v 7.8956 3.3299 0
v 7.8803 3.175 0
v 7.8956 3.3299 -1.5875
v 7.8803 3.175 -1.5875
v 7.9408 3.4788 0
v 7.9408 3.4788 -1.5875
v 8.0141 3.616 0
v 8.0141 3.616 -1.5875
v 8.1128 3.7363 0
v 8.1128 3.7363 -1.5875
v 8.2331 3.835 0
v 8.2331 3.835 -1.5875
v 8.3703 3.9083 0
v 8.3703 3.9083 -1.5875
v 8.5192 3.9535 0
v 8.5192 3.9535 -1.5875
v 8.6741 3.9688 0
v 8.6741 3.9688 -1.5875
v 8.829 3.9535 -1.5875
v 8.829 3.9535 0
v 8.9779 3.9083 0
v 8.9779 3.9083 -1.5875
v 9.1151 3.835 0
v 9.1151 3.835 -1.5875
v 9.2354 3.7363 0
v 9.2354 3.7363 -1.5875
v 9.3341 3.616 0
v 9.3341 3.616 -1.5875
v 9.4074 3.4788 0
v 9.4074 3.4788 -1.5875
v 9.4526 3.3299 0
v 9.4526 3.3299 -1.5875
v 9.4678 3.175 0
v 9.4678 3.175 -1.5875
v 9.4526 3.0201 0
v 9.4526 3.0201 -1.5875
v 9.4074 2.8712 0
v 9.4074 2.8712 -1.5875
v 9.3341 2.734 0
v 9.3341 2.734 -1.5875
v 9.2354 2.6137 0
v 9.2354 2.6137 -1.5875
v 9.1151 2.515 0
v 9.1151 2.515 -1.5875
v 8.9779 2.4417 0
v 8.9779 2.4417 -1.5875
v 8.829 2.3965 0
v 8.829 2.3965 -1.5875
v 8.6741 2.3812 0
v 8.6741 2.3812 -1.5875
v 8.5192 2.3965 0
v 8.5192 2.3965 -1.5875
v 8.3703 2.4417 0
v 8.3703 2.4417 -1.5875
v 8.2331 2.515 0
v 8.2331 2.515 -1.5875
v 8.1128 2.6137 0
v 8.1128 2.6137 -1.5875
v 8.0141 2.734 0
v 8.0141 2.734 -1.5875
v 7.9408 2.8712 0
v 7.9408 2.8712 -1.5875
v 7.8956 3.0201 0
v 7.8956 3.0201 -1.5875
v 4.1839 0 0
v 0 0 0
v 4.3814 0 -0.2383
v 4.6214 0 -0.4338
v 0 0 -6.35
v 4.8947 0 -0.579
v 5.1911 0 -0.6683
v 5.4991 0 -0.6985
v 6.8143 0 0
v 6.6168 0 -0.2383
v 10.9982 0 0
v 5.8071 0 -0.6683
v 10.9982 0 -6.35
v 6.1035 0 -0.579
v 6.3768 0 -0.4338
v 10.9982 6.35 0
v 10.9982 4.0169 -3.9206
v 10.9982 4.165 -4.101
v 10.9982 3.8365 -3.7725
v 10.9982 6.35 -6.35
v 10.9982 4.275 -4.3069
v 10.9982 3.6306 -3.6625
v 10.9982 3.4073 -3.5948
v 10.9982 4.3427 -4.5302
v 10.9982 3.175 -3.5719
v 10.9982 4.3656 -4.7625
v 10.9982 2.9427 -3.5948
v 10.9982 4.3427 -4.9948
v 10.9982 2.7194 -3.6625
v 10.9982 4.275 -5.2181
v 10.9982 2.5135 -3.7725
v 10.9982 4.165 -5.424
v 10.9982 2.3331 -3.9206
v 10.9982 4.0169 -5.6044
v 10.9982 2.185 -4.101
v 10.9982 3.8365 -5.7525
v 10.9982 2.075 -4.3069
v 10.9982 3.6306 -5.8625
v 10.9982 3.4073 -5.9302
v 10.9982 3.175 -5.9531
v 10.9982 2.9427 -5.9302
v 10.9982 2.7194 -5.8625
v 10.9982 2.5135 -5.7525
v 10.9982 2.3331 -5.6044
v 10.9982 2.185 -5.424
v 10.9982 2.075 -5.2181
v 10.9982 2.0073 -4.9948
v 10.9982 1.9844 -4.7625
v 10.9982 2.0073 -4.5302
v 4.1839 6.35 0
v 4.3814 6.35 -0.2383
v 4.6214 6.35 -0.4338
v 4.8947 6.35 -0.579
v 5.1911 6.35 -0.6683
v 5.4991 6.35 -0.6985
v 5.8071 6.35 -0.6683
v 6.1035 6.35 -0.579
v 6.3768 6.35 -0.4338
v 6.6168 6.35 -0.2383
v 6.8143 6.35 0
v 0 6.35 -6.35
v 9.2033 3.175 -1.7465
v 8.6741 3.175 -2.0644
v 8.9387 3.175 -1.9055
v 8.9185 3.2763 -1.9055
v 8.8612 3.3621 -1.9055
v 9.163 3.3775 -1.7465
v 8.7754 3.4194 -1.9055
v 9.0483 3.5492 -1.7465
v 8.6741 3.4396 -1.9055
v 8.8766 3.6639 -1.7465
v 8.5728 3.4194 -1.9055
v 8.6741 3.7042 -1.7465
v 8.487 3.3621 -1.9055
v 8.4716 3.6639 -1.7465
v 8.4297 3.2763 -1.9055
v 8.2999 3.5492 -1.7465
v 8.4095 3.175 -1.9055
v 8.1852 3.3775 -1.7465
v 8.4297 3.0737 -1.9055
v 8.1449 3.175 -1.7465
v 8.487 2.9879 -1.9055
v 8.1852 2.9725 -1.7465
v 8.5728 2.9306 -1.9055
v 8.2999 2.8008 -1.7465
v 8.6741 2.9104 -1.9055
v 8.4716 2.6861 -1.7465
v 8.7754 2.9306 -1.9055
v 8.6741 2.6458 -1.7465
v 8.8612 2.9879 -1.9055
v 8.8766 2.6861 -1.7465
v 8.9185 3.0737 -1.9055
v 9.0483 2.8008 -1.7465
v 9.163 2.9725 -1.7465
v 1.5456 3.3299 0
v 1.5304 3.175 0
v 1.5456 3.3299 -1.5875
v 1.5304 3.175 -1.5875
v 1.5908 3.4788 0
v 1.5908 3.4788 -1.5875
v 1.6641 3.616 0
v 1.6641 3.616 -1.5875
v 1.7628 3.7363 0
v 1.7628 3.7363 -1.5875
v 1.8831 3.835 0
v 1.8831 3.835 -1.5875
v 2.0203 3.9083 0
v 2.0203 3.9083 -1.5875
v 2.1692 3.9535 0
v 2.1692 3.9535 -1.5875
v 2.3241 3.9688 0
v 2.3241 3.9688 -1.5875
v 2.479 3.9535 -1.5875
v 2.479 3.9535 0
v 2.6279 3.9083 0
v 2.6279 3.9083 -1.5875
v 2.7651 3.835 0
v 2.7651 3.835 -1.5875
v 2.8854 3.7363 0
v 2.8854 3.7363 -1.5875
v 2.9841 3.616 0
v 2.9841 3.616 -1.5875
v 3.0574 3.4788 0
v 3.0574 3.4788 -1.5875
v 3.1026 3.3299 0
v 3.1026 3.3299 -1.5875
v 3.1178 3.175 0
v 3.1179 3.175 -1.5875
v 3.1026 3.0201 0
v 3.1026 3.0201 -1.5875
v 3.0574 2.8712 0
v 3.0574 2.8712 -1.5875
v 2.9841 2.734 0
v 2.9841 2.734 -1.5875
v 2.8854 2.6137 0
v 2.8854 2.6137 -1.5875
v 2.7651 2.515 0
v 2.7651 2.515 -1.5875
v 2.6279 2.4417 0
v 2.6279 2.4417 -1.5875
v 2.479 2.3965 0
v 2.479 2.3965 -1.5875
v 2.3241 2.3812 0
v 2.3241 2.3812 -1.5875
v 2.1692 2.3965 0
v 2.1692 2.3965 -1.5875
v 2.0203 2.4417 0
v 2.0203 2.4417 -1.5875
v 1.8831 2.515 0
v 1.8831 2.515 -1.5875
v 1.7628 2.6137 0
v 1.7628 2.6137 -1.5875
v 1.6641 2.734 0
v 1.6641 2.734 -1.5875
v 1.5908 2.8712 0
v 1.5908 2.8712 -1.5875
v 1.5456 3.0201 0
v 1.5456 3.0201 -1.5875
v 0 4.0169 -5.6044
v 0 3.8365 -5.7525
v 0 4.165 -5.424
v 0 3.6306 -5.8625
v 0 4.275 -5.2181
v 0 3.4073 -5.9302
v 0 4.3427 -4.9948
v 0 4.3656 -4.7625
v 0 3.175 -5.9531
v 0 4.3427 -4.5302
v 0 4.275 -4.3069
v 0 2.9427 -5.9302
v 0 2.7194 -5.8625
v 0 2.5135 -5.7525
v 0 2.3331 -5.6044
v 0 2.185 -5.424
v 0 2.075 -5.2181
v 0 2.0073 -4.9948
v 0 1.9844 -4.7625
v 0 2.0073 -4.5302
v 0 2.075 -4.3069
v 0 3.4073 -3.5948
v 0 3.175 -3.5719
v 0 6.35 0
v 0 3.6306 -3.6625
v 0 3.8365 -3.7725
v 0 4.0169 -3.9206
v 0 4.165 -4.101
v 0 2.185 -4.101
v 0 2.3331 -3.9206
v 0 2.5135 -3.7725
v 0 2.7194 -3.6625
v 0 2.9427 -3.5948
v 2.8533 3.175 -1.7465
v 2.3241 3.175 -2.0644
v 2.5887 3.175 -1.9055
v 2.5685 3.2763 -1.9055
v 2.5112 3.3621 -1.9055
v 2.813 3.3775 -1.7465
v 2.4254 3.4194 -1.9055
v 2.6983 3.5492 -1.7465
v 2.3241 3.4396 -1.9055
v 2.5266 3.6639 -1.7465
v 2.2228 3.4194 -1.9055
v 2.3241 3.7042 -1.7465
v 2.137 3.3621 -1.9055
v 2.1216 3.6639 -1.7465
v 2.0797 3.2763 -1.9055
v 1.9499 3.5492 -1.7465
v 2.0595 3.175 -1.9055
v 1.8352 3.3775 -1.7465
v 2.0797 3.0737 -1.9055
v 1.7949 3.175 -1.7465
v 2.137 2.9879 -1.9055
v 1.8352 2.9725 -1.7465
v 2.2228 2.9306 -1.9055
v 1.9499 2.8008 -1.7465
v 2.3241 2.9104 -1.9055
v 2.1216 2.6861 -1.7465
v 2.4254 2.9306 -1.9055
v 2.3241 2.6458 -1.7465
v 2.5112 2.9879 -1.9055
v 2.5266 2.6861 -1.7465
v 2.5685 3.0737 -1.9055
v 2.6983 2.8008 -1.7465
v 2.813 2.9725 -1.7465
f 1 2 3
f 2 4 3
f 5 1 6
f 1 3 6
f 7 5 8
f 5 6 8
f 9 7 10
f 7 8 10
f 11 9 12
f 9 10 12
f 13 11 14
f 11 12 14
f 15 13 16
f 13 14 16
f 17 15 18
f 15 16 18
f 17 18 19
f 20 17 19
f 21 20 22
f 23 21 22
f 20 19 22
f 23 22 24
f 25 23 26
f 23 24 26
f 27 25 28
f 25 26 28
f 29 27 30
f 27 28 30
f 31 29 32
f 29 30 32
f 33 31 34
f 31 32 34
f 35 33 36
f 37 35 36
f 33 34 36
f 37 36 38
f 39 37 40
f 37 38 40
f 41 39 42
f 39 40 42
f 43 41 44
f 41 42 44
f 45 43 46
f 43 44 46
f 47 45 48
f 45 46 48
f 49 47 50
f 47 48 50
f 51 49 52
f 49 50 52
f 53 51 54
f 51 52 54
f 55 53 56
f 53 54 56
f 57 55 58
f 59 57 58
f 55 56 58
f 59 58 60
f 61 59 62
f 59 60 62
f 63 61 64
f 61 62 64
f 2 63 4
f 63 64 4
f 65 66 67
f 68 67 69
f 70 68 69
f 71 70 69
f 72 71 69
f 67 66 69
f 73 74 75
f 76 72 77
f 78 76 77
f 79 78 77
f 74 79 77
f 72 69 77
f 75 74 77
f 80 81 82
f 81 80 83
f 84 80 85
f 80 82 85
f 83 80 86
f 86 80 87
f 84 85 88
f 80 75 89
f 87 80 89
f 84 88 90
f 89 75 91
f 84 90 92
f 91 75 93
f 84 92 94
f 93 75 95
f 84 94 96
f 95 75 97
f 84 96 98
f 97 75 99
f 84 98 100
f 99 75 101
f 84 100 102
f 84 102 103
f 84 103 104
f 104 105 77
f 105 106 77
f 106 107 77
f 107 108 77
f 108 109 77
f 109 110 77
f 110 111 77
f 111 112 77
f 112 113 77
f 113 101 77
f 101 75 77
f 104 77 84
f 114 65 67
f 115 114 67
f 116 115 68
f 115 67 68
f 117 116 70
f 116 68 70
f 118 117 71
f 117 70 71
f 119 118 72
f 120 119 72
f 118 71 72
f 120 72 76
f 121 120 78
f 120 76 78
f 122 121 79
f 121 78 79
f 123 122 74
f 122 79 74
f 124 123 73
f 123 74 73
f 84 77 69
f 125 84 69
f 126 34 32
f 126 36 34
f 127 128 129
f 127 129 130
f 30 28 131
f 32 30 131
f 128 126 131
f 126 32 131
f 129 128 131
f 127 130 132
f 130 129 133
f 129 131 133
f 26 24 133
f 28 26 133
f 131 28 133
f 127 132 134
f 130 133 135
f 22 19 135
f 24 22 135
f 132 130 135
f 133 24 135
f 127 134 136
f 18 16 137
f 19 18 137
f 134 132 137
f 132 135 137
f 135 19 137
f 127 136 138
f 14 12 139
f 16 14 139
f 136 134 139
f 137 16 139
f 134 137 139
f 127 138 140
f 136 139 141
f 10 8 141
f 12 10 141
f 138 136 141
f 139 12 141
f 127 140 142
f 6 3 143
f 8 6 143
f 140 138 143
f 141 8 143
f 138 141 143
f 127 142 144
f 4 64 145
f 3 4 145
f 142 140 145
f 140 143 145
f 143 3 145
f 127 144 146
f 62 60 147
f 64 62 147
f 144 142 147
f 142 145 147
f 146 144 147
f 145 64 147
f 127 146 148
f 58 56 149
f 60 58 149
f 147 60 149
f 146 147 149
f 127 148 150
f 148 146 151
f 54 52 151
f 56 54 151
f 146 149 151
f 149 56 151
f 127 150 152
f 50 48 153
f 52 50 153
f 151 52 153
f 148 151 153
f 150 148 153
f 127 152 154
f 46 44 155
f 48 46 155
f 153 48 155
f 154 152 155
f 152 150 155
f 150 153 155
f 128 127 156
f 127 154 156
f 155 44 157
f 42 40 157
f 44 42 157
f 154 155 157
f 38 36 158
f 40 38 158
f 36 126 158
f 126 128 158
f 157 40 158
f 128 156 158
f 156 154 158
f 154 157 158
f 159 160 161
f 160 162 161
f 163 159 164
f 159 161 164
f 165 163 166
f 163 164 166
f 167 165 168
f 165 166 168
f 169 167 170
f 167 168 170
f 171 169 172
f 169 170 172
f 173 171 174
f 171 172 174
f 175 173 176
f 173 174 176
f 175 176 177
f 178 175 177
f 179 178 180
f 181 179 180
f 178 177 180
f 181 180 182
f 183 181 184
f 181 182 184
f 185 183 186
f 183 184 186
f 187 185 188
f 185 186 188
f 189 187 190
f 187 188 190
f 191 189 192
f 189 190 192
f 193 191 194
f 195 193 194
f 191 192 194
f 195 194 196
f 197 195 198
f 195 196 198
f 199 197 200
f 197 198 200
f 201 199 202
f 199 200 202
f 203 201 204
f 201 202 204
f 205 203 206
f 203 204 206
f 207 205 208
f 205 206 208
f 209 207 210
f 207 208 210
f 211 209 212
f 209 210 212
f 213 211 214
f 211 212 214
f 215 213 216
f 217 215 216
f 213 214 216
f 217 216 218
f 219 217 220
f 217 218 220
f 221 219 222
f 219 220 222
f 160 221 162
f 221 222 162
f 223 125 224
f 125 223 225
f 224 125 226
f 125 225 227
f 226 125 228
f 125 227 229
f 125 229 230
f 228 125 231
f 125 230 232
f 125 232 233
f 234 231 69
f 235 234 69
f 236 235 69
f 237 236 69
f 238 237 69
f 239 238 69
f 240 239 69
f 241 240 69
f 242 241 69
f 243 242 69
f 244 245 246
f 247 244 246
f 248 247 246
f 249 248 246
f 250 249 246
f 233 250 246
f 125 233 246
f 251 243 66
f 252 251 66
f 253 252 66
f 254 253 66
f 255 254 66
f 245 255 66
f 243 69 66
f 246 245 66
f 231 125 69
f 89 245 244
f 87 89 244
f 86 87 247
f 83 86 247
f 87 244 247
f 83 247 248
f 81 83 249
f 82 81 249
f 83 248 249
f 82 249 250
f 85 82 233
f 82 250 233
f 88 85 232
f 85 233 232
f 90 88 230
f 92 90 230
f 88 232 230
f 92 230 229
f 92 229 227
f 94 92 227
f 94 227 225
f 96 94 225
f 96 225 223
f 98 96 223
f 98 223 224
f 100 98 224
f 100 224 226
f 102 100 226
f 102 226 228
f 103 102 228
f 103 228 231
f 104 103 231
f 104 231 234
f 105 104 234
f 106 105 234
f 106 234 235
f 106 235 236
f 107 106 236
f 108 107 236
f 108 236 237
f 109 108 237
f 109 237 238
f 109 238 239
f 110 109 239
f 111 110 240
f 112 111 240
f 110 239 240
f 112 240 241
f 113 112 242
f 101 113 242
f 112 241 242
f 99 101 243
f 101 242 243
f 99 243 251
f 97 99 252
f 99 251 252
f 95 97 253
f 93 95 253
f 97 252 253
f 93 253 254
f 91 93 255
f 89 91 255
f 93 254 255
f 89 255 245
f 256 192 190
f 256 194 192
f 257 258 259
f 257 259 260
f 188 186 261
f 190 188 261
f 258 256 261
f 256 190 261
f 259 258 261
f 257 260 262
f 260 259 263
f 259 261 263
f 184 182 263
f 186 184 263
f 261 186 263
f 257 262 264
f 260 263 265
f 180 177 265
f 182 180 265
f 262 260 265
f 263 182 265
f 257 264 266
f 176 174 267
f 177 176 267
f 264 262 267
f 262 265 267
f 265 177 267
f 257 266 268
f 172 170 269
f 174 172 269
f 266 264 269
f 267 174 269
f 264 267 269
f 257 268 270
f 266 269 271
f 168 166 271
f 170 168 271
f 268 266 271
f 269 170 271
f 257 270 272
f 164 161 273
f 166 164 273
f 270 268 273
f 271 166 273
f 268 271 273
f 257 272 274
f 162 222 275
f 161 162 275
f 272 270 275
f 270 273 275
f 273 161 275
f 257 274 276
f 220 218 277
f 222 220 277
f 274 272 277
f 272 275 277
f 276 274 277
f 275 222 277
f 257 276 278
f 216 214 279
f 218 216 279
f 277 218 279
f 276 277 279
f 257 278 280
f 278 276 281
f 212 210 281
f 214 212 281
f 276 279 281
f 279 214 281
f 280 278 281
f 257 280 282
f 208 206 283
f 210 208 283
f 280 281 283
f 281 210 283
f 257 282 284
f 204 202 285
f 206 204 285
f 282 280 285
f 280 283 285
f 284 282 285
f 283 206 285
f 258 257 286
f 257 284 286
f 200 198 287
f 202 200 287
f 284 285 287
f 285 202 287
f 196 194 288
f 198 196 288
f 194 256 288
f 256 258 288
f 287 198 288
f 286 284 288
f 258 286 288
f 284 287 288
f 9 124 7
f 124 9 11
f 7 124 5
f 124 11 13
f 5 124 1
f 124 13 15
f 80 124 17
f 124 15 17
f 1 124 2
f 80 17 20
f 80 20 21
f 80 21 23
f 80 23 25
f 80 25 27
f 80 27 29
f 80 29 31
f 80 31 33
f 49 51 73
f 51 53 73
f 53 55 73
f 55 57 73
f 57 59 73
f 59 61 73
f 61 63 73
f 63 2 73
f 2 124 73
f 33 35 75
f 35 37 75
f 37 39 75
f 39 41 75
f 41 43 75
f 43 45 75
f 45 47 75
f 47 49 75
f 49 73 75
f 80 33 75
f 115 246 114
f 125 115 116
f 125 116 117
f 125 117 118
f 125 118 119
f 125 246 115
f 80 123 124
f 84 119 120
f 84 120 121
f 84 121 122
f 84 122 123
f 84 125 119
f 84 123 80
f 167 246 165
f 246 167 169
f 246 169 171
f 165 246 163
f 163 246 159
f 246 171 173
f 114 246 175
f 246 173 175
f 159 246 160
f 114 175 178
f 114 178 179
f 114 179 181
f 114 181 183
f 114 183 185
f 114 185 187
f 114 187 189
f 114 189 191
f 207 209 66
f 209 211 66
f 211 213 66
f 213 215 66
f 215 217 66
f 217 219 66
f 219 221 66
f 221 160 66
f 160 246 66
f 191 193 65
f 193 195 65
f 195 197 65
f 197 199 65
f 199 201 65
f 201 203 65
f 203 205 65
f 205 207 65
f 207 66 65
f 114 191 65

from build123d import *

# Parameters (mm, degrees)
BOSS_EXTRUDE1_DEPTH                = 6.35
F_1_16_0_0625_DIAMETER_HOLE1_D     = 1.5875
F_1_16_0_0625_DIAMETER_HOLE1_DEPTH = 1.5875
F_1_16_0_0625_DIAMETER_HOLE1_TIP   = 0.476933116
F_3_32_0_09375_DIAMETER_HOLE1_D    = 2.38125


with BuildPart() as part:
    # Sketch1 → Boss-Extrude1 (new body)
    with BuildSketch(Plane(origin=(0, 0, 0), x_dir=(1, 0, 0), z_dir=(0, 1, 0))):
        with BuildLine():
            Line((6.814332014, 0), (10.9982, 0))
            Line((10.9982, 0), (10.9982, 6.35))
            Line((10.9982, 6.35), (0, 6.35))
            Line((0, 6.35), (0, 0))
            Line((0, 0), (4.183867986, 0))
            ThreePointArc((4.183867986, 0), (5.4991, 0.6985), (6.814332014, 0))
        make_face()
    extrude(amount=BOSS_EXTRUDE1_DEPTH)

    # 1/16 (0.0625) Diameter Hole1
    with Locations(Plane.XY):
        with Locations((2.3241, 3.175), (8.6741, 3.175)):
            Hole(F_1_16_0_0625_DIAMETER_HOLE1_D / 2, depth=F_1_16_0_0625_DIAMETER_HOLE1_DEPTH)
            with Locations((0, 0, -(F_1_16_0_0625_DIAMETER_HOLE1_DEPTH + F_1_16_0_0625_DIAMETER_HOLE1_TIP / 2))):  # 118° drill point
                Cone(0, F_1_16_0_0625_DIAMETER_HOLE1_D / 2, F_1_16_0_0625_DIAMETER_HOLE1_TIP, mode=Mode.SUBTRACT)

    # 3/32 (0.09375) Diameter Hole1 (through all)
    with Locations(Plane(origin=(10.9982, 0, 0), x_dir=(0, 0, -1), z_dir=(1, 0, 0))):
        with Locations((4.7625, 3.175)):
            Hole(F_3_32_0_09375_DIAMETER_HOLE1_D / 2)


solid = part.part
